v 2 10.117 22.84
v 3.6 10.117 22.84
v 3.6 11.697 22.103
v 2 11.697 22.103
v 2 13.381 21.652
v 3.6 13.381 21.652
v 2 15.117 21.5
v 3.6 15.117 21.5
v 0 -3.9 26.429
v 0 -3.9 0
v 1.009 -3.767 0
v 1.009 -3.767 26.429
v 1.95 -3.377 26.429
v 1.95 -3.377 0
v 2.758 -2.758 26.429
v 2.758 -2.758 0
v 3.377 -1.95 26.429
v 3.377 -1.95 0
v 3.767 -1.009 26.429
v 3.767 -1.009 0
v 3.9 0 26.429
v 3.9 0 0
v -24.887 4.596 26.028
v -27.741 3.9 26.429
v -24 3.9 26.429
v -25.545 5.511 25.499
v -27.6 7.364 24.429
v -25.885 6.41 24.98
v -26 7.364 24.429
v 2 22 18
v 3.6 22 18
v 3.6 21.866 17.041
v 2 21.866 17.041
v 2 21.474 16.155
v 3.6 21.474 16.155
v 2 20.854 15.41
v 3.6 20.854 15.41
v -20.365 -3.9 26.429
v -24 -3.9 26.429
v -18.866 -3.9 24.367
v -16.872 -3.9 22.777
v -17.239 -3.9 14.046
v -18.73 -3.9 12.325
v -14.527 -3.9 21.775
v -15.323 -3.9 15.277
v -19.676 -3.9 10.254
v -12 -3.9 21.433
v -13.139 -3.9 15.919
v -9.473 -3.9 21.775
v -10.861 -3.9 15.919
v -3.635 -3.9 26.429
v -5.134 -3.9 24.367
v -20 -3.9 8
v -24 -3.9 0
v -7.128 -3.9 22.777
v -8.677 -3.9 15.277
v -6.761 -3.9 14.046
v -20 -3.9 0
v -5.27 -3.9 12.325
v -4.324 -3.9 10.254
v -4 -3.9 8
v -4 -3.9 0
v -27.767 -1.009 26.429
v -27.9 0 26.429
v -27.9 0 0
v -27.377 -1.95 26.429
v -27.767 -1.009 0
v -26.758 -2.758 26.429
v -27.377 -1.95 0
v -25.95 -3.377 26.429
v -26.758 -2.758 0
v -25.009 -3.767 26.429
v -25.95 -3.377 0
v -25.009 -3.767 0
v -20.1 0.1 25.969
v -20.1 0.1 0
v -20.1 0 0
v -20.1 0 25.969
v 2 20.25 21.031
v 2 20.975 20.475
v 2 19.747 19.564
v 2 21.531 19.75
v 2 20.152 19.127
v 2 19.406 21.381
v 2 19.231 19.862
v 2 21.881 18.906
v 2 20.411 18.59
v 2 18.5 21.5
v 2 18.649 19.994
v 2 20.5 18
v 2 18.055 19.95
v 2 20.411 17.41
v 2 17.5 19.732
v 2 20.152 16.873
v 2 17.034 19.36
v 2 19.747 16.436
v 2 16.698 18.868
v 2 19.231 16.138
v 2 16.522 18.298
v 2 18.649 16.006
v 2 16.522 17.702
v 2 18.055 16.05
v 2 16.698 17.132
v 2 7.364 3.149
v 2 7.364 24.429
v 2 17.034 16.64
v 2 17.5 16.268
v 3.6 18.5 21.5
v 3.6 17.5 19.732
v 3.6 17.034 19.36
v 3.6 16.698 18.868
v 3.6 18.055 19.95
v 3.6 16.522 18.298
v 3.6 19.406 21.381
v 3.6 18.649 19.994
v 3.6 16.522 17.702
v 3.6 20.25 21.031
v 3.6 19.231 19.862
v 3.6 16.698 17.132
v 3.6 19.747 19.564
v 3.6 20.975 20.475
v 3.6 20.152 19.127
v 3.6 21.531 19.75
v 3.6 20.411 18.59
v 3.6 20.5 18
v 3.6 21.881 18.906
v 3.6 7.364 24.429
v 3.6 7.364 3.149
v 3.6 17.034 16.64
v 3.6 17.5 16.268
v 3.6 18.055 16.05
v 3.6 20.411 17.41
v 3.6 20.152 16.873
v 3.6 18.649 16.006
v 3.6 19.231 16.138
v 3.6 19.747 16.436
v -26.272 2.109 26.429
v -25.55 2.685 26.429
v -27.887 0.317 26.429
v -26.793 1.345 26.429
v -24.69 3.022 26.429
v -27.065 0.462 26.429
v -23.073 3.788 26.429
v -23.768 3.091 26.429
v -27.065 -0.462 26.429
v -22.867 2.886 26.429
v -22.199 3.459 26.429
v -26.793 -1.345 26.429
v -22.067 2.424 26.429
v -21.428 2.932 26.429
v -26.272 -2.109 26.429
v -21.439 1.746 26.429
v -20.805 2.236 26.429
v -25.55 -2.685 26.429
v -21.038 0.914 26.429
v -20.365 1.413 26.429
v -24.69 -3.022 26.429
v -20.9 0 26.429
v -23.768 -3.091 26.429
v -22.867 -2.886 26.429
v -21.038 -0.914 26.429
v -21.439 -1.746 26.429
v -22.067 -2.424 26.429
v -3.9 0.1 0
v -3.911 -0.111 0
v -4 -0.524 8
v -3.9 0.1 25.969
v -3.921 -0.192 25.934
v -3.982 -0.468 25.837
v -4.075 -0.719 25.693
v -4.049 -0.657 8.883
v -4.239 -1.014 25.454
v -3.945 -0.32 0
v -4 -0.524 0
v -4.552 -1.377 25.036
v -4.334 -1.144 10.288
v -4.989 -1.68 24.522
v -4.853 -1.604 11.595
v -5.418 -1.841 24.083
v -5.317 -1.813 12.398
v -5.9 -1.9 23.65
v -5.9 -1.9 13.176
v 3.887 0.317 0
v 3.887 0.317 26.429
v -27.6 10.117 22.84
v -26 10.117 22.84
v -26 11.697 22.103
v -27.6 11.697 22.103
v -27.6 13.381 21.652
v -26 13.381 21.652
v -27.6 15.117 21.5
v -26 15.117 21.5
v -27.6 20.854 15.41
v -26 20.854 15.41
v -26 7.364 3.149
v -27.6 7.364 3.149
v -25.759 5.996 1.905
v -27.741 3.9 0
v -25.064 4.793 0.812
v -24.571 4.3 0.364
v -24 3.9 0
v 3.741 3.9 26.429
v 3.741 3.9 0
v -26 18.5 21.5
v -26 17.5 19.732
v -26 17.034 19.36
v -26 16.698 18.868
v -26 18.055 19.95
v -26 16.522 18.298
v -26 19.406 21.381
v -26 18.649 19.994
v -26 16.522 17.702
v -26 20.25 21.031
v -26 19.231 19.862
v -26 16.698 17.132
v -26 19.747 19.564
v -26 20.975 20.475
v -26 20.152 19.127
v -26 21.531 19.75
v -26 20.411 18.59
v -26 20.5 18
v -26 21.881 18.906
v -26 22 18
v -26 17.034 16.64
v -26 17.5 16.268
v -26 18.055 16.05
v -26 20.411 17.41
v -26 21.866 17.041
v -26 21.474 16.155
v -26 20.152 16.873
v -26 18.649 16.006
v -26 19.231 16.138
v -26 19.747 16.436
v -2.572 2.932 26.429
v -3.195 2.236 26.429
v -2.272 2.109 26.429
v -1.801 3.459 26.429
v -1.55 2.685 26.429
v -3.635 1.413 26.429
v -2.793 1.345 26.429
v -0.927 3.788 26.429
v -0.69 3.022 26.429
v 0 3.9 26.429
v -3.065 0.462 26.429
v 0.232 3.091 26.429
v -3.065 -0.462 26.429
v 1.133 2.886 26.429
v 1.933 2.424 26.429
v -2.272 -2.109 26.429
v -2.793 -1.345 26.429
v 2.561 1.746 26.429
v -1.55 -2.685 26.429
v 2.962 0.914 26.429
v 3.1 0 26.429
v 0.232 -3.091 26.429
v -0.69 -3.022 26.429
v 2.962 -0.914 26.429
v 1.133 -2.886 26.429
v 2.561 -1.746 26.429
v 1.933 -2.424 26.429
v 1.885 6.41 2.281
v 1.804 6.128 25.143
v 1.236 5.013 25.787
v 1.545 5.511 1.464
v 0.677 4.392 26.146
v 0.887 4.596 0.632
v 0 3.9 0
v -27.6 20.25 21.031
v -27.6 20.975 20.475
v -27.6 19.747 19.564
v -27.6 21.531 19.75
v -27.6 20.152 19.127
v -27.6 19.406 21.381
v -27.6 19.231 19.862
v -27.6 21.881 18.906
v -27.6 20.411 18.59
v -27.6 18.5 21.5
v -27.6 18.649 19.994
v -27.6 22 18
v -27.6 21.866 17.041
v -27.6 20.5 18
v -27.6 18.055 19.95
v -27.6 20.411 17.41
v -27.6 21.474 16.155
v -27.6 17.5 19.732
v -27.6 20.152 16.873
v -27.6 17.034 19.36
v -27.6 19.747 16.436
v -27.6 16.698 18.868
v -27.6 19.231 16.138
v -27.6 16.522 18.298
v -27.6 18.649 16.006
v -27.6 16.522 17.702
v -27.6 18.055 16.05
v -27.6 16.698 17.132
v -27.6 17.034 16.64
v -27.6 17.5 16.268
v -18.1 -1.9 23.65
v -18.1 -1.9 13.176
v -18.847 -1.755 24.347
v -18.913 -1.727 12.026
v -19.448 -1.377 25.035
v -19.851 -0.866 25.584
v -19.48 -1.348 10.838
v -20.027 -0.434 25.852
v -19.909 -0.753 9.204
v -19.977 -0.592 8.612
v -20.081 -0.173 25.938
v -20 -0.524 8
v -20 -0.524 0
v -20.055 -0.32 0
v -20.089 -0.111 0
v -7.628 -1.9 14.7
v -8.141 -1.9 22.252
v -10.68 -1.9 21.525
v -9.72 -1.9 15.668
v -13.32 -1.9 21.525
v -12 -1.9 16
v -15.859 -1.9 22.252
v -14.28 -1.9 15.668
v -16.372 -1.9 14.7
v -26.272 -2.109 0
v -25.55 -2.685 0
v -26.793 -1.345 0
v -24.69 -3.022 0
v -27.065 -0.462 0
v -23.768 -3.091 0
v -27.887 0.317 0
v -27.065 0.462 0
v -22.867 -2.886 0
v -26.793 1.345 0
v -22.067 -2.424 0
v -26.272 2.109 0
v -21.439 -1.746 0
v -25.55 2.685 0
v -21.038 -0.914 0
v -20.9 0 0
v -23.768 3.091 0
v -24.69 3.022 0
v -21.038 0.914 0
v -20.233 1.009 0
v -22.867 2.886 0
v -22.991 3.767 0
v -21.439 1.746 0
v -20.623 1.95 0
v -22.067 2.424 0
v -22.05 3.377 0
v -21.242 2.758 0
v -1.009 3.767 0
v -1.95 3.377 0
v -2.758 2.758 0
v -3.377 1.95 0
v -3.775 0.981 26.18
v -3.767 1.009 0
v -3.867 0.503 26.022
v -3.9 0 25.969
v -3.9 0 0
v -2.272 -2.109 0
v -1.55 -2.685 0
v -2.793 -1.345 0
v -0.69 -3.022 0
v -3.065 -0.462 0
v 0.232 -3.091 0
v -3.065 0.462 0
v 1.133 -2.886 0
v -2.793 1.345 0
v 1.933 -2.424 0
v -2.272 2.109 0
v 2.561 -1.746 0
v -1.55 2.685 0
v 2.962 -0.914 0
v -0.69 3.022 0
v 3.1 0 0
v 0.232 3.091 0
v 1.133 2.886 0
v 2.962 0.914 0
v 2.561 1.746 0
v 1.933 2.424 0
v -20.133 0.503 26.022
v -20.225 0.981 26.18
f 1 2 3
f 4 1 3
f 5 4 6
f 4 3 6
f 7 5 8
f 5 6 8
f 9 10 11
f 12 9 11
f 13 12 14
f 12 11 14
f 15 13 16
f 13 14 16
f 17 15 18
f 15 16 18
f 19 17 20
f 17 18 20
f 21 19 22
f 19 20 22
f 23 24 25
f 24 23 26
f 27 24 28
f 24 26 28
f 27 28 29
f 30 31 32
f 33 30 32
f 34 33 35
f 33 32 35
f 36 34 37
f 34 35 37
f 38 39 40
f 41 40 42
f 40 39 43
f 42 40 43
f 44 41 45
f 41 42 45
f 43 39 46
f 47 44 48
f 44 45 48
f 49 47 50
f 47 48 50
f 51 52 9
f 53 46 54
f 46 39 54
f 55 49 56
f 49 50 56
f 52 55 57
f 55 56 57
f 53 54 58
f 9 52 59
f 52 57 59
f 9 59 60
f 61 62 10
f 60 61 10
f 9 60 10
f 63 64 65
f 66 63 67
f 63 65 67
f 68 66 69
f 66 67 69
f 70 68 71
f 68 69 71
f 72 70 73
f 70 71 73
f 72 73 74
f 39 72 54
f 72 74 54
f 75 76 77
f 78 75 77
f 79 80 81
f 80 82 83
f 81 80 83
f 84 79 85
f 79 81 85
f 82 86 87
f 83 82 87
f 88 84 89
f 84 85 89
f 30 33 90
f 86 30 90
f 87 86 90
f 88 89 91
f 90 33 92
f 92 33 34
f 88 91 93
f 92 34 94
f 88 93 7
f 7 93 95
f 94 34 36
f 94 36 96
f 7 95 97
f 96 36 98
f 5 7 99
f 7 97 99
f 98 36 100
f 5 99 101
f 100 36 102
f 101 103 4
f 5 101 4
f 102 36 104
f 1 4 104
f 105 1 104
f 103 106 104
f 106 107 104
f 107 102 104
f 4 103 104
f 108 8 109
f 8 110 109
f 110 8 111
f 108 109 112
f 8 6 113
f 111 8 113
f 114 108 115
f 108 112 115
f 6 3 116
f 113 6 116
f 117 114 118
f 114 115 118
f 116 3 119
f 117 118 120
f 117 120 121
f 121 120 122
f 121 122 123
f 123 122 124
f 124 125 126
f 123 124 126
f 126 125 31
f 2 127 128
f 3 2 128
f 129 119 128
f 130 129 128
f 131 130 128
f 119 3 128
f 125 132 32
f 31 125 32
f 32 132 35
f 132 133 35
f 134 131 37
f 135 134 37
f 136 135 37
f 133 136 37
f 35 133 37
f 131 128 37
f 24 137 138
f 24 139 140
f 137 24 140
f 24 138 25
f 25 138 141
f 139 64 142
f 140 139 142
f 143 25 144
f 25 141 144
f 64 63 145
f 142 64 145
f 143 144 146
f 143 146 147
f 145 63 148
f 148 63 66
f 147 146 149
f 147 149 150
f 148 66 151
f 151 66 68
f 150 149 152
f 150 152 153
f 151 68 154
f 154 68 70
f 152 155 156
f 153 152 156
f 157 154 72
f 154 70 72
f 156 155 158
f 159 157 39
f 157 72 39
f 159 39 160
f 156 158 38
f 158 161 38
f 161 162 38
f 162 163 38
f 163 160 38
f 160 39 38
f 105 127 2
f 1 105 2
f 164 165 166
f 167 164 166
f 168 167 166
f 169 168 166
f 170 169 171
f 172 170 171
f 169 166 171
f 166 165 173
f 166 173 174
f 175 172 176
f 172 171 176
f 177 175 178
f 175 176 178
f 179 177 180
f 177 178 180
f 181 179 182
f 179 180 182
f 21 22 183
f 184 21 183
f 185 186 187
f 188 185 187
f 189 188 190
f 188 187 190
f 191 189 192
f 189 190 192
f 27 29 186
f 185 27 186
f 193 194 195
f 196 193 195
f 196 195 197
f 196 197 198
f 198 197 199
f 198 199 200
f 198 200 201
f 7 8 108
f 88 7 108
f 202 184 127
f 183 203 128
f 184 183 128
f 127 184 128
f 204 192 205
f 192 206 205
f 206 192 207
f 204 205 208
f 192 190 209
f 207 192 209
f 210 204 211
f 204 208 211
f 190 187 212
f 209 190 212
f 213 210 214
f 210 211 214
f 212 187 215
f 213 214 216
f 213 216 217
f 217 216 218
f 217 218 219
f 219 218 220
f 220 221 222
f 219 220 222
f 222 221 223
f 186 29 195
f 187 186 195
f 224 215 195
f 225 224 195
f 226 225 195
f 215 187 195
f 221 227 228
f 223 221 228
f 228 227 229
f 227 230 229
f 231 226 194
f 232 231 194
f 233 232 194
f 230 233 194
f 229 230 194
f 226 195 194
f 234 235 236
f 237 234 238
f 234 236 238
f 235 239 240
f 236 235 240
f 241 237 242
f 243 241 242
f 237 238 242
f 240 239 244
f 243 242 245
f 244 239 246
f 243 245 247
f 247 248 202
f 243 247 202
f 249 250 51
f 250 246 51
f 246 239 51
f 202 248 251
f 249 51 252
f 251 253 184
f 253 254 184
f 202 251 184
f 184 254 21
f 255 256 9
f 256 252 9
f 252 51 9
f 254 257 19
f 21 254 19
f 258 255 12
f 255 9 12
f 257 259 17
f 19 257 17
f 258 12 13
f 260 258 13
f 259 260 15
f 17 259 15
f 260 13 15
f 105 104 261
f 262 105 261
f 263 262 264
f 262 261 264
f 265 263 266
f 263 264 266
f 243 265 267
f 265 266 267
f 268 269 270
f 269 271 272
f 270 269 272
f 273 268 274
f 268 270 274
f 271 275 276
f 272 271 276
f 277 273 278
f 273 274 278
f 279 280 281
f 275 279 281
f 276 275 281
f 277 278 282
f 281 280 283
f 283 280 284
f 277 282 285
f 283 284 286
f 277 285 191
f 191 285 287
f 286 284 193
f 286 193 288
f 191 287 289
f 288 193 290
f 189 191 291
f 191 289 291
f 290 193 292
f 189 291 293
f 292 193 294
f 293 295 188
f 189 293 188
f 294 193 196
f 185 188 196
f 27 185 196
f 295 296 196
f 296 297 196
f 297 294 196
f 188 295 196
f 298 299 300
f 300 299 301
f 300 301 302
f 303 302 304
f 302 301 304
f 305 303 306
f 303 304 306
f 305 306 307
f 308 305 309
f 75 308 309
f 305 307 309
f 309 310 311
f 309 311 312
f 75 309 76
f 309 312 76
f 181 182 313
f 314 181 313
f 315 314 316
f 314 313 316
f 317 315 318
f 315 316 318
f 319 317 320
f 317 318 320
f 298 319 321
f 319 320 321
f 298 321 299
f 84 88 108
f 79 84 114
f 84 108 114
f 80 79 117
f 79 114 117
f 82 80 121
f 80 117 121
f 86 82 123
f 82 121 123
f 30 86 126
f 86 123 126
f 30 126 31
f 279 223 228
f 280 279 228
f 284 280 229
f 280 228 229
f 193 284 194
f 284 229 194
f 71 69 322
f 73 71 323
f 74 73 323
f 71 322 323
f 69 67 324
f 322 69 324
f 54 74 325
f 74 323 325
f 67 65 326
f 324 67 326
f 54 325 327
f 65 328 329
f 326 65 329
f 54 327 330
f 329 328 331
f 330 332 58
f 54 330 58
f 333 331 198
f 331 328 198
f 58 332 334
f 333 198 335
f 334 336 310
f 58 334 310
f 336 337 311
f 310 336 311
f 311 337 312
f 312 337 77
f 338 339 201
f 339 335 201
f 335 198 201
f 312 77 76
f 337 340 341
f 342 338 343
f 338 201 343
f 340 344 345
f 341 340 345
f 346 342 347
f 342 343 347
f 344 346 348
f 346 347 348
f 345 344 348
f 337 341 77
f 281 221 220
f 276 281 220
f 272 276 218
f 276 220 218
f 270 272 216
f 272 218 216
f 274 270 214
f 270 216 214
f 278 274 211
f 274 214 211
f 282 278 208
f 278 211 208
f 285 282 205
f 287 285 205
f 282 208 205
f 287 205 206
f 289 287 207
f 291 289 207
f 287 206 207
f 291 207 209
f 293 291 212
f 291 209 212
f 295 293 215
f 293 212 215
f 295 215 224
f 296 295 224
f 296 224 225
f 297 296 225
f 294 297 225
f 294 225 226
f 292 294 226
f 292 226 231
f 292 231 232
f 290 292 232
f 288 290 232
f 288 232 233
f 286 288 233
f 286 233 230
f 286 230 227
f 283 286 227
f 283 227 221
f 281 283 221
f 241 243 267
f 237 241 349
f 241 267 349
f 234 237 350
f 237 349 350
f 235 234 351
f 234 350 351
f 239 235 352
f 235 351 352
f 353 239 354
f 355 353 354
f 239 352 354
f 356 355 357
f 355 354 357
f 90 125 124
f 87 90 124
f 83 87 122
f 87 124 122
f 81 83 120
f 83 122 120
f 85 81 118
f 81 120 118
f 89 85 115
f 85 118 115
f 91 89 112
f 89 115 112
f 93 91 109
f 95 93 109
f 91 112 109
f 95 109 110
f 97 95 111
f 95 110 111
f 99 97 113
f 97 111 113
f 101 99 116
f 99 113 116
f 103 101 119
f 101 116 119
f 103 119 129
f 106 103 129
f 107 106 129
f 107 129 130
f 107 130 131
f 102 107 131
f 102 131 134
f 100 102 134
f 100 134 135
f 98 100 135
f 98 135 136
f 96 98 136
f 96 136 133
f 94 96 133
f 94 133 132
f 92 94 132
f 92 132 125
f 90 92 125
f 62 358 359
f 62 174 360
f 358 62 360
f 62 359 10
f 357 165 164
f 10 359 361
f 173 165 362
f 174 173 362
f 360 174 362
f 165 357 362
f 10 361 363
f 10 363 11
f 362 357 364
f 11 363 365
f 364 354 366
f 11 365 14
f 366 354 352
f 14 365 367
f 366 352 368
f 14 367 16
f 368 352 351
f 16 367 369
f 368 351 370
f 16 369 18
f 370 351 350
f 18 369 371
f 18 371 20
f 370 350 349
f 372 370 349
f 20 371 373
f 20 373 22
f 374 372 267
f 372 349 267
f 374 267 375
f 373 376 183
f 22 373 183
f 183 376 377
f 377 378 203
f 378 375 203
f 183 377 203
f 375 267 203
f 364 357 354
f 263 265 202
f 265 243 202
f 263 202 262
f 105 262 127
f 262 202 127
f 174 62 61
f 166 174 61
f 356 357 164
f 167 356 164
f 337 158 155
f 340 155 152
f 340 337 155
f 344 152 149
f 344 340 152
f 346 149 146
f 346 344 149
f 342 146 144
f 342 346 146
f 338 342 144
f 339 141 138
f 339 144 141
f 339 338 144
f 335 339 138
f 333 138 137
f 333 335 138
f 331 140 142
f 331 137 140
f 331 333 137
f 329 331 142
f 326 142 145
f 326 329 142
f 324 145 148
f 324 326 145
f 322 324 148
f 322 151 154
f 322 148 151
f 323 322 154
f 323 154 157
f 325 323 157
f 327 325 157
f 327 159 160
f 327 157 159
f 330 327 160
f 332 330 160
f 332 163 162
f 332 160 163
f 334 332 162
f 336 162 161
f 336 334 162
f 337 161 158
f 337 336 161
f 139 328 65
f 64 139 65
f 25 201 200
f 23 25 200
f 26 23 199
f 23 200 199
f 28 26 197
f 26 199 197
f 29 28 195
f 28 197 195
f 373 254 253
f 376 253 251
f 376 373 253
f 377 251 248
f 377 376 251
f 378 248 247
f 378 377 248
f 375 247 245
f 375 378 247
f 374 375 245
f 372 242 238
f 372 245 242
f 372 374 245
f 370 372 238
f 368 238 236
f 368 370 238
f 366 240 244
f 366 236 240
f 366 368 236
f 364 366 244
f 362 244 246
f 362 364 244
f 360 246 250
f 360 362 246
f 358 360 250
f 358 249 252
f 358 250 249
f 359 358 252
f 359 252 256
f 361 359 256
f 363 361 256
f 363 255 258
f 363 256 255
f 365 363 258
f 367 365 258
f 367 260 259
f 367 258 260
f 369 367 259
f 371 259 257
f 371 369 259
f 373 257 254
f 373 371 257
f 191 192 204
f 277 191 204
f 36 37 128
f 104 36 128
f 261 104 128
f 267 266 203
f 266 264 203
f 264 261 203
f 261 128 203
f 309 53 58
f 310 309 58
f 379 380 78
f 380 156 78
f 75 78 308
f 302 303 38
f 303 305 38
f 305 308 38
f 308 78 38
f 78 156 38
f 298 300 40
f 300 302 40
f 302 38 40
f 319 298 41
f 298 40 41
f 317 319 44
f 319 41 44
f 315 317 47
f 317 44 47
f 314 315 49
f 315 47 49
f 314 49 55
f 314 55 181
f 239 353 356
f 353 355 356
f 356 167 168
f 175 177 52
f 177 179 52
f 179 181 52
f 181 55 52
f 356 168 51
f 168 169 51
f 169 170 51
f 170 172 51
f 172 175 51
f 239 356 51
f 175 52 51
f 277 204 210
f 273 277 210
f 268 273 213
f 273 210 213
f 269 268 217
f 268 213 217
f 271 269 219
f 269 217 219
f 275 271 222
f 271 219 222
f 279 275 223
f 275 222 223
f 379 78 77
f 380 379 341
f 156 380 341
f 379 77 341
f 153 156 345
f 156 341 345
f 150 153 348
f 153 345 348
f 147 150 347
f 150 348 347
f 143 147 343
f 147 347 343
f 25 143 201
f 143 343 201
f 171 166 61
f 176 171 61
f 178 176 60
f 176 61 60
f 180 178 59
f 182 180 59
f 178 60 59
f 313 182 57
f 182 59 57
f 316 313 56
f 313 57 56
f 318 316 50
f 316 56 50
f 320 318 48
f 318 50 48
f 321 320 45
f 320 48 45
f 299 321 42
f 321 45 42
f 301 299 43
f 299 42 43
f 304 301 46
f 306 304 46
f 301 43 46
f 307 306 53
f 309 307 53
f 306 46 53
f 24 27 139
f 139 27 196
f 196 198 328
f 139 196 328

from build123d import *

# Parameters (mm, degrees)
F0_R          = 3.1
F1_DEPTH      = 35
F2_R          = 2
F3_DEPTH      = 31.501
F3_DEPTH_BACK = 0.301
F5_DEPTH      = 25.901


# Not quite as in the source:
# - a feature names something its author has since deleted; it is built from what else it names


with BuildPart() as f1:
    # F0 (on Top) → F1 (new body)
    with BuildSketch(Plane.XY):
        with BuildLine():
            ThreePointArc((-27.9, 0), (-26.7577164466, -2.7577164466), (-24, -3.9))
            ThreePointArc((-24, -3.9), (-21.2422835534, -2.7577164466), (-20.1, 0))
            ThreePointArc((-20.1, 0), (-21.2422835534, 2.7577164466), (-24, 3.9))
            ThreePointArc((-24, 3.9), (-26.643179735, 2.8676821456), (-27.8870765814, 0.3172312247))
            Line((-27.8870765814, 0.3172312247), (-27.9, 0))
        make_face()
        with Locations((-24, 0)):
            Circle(F0_R, mode=Mode.SUBTRACT)
        with BuildLine():
            Line((-27.6, 7.3641016151), (-27.8870765814, 0.3172312247))
            ThreePointArc((-27.8870765814, 0.3172312247), (-26.643179735, 2.8676821456), (-24, 3.9))
            ThreePointArc((-24, 3.9), (-25.4641016151, 5.3641016151), (-26, 7.3641016151))
            Line((-26, 7.3641016151), (-26, 22))
            Line((-26, 22), (-27.6, 22))
            Line((-27.6, 22), (-27.6, 7.3641016151))
        make_face()
        with BuildLine():
            ThreePointArc((0, -3.9), (-2.7577164466, -2.7577164466), (-3.9, 0))
            Line((-3.9, 0), (-3.9, 0.1))
            ThreePointArc((-3.9, 0.1), (-4.4857864376, -1.3142135624), (-5.9, -1.9))
            Line((-5.9, -1.9), (-18.1, -1.9))
            ThreePointArc((-18.1, -1.9), (-19.5142135624, -1.3142135624), (-20.1, 0.1))
            Line((-20.1, 0.1), (-20.1, 0))
            ThreePointArc((-20.1, 0), (-21.2422835534, -2.7577164466), (-24, -3.9))
            Line((-24, -3.9), (0, -3.9))
        make_face()
        with BuildLine():
            Line((3.9, 0), (3.8870765814, 0.3172312247))
            ThreePointArc((3.8870765814, 0.3172312247), (2.643179735, 2.8676821456), (0, 3.9))
            ThreePointArc((0, 3.9), (-2.7577164466, 2.7577164466), (-3.9, 0))
            ThreePointArc((-3.9, 0), (-2.7577164466, -2.7577164466), (0, -3.9))
            ThreePointArc((0, -3.9), (2.7577164466, -2.7577164466), (3.9, 0))
        make_face()
        Circle(F0_R, mode=Mode.SUBTRACT)
        with BuildLine():
            Line((3.6, 7.3641016151), (3.6, 22))
            Line((3.6, 22), (2, 22))
            Line((2, 22), (2, 7.3641016151))
            ThreePointArc((2, 7.3641016151), (1.4641016151, 5.3641016151), (0, 3.9))
            ThreePointArc((0, 3.9), (2.643179735, 2.8676821456), (3.8870765814, 0.3172312247))
            Line((3.8870765814, 0.3172312247), (3.6, 7.3641016151))
        make_face()
    extrude(amount=F1_DEPTH)

    # F2 (on face) → F3 (cut, two sides)
    with BuildSketch(Plane.YZ.offset(3.6)) as f3_sk:
        with BuildLine():
            ThreePointArc((18.5, 21.5), (20.9748737342, 20.4748737342), (22, 18))
            Line((22, 18), (22, 35))
            Line((22, 35), (7.3641016151, 35))
            Line((7.3641016151, 35), (7.3641016151, 24.4293139302))
            Line((7.3641016151, 24.4293139302), (10.1173140978, 22.8397459622))
            ThreePointArc((10.1173140978, 22.8397459622), (12.5291236468, 21.8407417371), (15.1173140978, 21.5))
            Line((15.1173140978, 21.5), (18.5, 21.5))
        make_face()
        Polygon((22, 35), (22, 18), (29.6666024476, 18), (29.6666024476, 42.8468726724), (-4.3945980379, 42.8468726724), (-4.3945980379, 31.2182023401), (7.3641016151, 24.4293139302), (7.3641016151, 35), align=None)
        with Locations((18.5, 18)):
            Circle(F2_R)
        with BuildLine():
            Line((22, 0), (22, 18))
            ThreePointArc((22, 18), (21.7007350945, 16.5839156612), (20.8541172259, 15.4099938057))
            Line((20.8541172259, 15.4099938057), (7.3641016151, 3.1486030042))
            Line((7.3641016151, 3.1486030042), (7.3641016151, 0))
            Line((7.3641016151, 0), (22, 0))
        make_face()
        Polygon((7.3641016151, 0), (7.3641016151, 3.1486030042), (3.9, 0), align=None)
    extrude(amount=-F3_DEPTH, mode=Mode.SUBTRACT)
    extrude(f3_sk.sketch, amount=F3_DEPTH_BACK, mode=Mode.SUBTRACT)

    # F4 (on face) → F5 (cut, through all)
    with BuildSketch(Plane.XZ.offset(3.9)):
        with BuildLine():
            ThreePointArc((-12, 0), (-6.3431457505, 2.3431457505), (-4, 8))
            ThreePointArc((-4, 8), (-12, 16), (-20, 8))
            ThreePointArc((-20, 8), (-17.6568542495, 2.3431457505), (-12, 0))
        make_face()
        with BuildLine():
            Line((-4, 0), (-4, 8))
            ThreePointArc((-4, 8), (-6.3431457505, 2.3431457505), (-12, 0))
            Line((-12, 0), (-4, 0))
        make_face()
        with BuildLine():
            ThreePointArc((-12, 0), (-17.6568542495, 2.3431457505), (-20, 8))
            Line((-20, 8), (-20, 0))
            Line((-20, 0), (-12, 0))
        make_face()
        with BuildLine():
            Line((0, 30.9326460298), (0, 26.4293139302))
            Line((0, 26.4293139302), (8.4664272144, 26.4293139302))
            Line((8.4664272144, 26.4293139302), (8.4664272144, 34.5878303051))
            Line((8.4664272144, 34.5878303051), (-3.2313269012, 34.5878303051))
            ThreePointArc((-3.2313269012, 34.5878303051), (-2.6846257606, 32.7964600712), (-2.5, 30.9326460298))
            Line((-2.5, 30.9326460298), (0, 30.9326460298))
        make_face()
        with BuildLine():
            Line((-3.6351927697, 26.4293139302), (0, 26.4293139302))
            Line((0, 26.4293139302), (0, 30.9326460298))
            Line((0, 30.9326460298), (-2.5, 30.9326460298))
            ThreePointArc((-2.5, 30.9326460298), (-2.7881687844, 28.6105423164), (-3.6351927697, 26.4293139302))
        make_face()
        with BuildLine():
            Line((-24, 30.9326460298), (-24, 26.4293139302))
            Line((-24, 26.4293139302), (-20.3648072303, 26.4293139302))
            ThreePointArc((-20.3648072303, 26.4293139302), (-21.2118312156, 28.6105423164), (-21.5, 30.9326460298))
            Line((-21.5, 30.9326460298), (-24, 30.9326460298))
        make_face()
        with BuildLine():
            Line((-31.3403680921, 26.4293139302), (-24, 26.4293139302))
            Line((-24, 26.4293139302), (-24, 30.9326460298))
            Line((-24, 30.9326460298), (-21.5, 30.9326460298))
            ThreePointArc((-21.5, 30.9326460298), (-21.3153742394, 32.7964600712), (-20.7686730988, 34.5878303051))
            Line((-20.7686730988, 34.5878303051), (-31.3403680921, 34.5878303051))
            Line((-31.3403680921, 34.5878303051), (-31.3403680921, 26.4293139302))
        make_face()
        with BuildLine():
            Line((-20.3648072303, 26.4293139302), (-3.6351927697, 26.4293139302))
            ThreePointArc((-3.6351927697, 26.4293139302), (-2.7881687844, 28.6105423164), (-2.5, 30.9326460298))
            Line((-2.5, 30.9326460298), (-21.5, 30.9326460298))
            ThreePointArc((-21.5, 30.9326460298), (-21.2118312156, 28.6105423164), (-20.3648072303, 26.4293139302))
        make_face()
        with BuildLine():
            ThreePointArc((-20.3648072303, 26.4293139302), (-12, 21.4326460298), (-3.6351927697, 26.4293139302))
            Line((-3.6351927697, 26.4293139302), (-20.3648072303, 26.4293139302))
        make_face()
    extrude(amount=-F5_DEPTH, mode=Mode.SUBTRACT)


solid = f1.part
